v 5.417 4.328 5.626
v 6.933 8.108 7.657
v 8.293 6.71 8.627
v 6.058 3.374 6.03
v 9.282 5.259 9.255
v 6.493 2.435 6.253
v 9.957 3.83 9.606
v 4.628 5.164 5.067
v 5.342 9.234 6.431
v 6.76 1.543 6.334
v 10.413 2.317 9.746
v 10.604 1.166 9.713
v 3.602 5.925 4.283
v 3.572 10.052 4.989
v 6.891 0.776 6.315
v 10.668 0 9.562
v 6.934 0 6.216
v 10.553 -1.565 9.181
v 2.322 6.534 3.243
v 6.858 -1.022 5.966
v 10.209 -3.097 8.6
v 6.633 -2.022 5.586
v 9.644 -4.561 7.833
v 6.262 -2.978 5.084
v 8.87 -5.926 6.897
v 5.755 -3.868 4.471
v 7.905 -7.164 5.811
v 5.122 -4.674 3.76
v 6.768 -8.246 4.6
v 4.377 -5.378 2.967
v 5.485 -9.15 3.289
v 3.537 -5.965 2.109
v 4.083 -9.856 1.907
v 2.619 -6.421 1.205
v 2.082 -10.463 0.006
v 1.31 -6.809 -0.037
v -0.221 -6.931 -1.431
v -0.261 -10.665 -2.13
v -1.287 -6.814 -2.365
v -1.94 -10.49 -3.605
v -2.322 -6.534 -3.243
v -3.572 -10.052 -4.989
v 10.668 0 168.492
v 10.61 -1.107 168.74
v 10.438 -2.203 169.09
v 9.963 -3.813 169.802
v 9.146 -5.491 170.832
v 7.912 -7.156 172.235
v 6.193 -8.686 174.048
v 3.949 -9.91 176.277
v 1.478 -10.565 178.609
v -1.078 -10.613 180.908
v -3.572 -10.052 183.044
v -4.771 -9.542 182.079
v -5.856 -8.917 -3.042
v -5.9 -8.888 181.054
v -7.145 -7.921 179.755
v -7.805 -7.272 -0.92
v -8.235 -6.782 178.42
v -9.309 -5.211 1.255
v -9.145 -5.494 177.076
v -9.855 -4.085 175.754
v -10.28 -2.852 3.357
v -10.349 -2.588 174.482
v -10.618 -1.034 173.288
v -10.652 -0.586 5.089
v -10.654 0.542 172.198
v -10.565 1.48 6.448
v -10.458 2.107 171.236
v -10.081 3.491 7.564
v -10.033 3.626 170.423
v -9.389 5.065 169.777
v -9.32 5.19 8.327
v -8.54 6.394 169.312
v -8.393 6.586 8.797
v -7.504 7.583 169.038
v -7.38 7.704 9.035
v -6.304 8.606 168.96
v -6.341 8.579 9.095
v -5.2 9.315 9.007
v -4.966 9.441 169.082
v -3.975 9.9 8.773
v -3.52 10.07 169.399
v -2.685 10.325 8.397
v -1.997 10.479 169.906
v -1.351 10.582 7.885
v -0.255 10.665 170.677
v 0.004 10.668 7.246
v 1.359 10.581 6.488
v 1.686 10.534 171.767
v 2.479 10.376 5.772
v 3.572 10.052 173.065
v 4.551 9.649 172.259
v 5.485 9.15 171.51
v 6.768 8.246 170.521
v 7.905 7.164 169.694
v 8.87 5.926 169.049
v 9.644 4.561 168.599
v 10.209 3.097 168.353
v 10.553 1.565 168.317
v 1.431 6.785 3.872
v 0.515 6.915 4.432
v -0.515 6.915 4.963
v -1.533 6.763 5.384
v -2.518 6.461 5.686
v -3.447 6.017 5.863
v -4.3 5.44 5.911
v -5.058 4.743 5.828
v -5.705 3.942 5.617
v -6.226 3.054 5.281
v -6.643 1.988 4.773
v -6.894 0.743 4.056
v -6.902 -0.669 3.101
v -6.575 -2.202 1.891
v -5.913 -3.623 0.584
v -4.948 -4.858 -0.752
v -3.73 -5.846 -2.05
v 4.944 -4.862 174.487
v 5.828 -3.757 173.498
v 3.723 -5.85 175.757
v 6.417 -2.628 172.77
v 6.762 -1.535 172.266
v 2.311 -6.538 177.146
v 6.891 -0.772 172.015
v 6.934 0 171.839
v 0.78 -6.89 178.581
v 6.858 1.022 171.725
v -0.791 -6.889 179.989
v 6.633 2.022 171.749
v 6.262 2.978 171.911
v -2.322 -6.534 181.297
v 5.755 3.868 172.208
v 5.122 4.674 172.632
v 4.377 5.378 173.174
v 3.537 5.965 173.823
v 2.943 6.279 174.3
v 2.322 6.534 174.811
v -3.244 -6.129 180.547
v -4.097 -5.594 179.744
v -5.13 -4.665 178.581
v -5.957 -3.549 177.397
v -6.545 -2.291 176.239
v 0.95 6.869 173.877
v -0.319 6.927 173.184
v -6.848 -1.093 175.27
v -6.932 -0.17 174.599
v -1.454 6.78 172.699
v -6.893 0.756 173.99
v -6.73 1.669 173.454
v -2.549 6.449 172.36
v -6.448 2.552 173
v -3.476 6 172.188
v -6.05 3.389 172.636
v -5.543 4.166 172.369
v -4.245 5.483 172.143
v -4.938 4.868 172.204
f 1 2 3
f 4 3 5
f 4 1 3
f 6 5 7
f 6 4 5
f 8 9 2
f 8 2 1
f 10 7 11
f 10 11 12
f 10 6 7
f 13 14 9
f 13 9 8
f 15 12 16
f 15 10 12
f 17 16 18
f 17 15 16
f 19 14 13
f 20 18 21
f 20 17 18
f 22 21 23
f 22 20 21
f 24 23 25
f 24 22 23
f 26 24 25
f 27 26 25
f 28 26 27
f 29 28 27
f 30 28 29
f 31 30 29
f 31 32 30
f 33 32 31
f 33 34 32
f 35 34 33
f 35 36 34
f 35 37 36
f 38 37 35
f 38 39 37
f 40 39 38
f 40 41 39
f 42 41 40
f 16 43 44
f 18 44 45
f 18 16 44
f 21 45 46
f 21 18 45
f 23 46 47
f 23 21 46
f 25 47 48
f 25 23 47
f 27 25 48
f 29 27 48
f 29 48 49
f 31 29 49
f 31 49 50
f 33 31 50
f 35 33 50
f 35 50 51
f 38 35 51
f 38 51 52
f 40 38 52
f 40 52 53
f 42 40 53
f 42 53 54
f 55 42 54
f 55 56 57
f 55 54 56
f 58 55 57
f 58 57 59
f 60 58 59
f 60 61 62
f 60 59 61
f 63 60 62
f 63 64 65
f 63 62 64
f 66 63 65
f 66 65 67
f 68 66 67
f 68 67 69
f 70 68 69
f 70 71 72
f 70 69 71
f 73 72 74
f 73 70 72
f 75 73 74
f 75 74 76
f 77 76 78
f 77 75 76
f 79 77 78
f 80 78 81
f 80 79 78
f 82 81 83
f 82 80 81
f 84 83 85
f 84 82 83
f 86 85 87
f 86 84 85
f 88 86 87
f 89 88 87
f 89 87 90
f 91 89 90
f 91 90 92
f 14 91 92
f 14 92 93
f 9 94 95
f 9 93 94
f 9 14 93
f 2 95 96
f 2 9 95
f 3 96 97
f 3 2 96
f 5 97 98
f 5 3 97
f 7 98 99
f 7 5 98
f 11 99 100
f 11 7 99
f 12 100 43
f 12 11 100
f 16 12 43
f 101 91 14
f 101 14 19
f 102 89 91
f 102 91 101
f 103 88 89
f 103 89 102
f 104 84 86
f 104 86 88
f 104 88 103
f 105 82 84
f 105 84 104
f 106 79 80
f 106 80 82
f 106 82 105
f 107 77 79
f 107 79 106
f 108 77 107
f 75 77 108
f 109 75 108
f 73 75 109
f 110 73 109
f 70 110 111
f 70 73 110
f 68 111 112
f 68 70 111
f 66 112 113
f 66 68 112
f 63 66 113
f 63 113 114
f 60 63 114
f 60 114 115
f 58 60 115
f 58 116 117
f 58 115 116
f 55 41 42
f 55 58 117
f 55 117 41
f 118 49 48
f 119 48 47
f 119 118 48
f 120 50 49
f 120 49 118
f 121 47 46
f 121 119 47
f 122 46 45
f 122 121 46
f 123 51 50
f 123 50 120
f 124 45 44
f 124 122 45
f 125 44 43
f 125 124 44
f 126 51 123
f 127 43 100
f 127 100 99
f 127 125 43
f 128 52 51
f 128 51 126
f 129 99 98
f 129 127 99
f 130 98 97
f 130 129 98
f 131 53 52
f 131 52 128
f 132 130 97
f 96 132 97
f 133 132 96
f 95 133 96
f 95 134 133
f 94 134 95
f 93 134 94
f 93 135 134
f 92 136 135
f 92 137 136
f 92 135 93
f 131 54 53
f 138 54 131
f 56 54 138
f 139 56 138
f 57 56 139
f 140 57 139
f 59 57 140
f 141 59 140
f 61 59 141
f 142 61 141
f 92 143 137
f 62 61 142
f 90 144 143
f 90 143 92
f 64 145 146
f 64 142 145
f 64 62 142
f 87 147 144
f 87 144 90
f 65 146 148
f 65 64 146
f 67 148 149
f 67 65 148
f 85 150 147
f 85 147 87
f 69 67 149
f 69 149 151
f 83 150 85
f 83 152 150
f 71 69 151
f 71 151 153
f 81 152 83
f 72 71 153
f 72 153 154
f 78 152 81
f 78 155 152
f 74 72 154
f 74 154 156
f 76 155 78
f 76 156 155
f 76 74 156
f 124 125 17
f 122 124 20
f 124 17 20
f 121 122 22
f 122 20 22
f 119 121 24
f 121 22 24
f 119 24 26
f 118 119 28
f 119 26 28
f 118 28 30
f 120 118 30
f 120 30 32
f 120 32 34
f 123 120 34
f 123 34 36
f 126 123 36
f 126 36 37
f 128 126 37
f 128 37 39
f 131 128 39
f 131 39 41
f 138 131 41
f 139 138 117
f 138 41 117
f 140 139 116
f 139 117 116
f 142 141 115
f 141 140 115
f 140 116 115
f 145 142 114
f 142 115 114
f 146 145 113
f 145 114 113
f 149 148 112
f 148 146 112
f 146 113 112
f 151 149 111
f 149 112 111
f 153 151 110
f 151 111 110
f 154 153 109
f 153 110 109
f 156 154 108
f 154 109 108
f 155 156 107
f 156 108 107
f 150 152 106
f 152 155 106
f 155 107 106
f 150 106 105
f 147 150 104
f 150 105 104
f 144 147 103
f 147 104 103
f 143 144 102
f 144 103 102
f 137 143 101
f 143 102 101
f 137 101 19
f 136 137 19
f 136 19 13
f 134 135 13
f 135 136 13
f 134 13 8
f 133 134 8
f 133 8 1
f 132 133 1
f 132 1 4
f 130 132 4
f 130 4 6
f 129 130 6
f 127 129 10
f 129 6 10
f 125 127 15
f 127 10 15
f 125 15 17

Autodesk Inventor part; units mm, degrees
ref_plane "Start Plane" through (0, 0, -4.9897) normal (0, 0, 1) x (1, 0, 0)
ref_plane "End Plane" through (0, 0, 183.044) normal (0, 0, 1) x (1, 0, 0)
sketch "Sketch" plane through (0, 0, 0) normal (0, 0, 1) x (1, 0, 0)
  circle A0 centre (0, 0) radius 6.9342
  circle A1 centre (0, 0) radius 10.668
  dimension "d0" = 21.336
  dimension "d1" = 3.7338
extrude "Body" add sketch "Sketch" along normal up to surface (188.0337 mm away) from surface at -4.9897
sketch "Sketch3" plane through (0, 0, 0) normal (0, 0, 1) x (1, 0, 0)
  line L0 (0, 0) -> (10, 0)
ref_plane "Work Plane3" through (0, 0, 0) normal (0, -1, 0) x (1, 0, 0)
sketch "Sketch4" plane through (0, 0, 0) normal (0, -1, 0) x (1, 0, 0)
  line L0 (-2, -4.9897) -> (12, -4.9897)
  line L1 (-2, 183.044) -> (12, 183.044)
  dimension "d7" = 188.0337
ref_plane "Work Plane4" through (-10.464, -2.0762, 187.8032) normal (0.6617, 0.1313, 0.7382) x (0.7481, -0.05, -0.6617)
split "Split1" plane through (-10.464, -2.0762, 187.8032) removes the side toward (0.6617, 0.1313, 0.7382)
ref_plane "Work Plane5" through (6.4449, -8.5011, 187.1496) normal (-0.392, 0.517, 0.761) x (0.9128, 0.1151, 0.392)
split "Split2" plane through (6.4449, -8.5011, 187.1496) removes the side toward (-0.392, 0.517, 0.761)
ref_plane "Work Plane6" through (-10.464, -2.0762, -9.7489) normal (0.6617, 0.1313, -0.7382) x (-0.6724, -0.3318, -0.6617)
split "Split3" plane through (-10.464, -2.0762, -9.7489) removes the side toward (0.6617, 0.1313, -0.7382)
ref_plane "Work Plane7" through (6.4449, -8.5011, -9.0952) normal (-0.392, 0.517, -0.761) x (0.3573, 0.8478, 0.392)
split "Split4" plane through (6.4449, -8.5011, -9.0952) removes the side toward (-0.392, 0.517, -0.761)
equation "\"d0\" = G_H"
equation "\"d1\" = G_T"
equation "\"d2\" = G_L"
equation "\"G_H\" = 21.336"
equation "\"G_T\" = 3.7338"
equation "\"G_L\" = 188.03367"
equation "\"G_OFFSET_START\" = 4.98966"
equation "\"G_OFFSET_END\" = 4.98966"
equation "\"d4\" = -G_OFFSET_START"
equation "\"d5\" = G_OFFSET_END + B_L"
equation "\"B_L\" = 178.05435"
properties part number "ANSI - 1/2 x 0.147 - 7.403" material "Steel, Mild"
